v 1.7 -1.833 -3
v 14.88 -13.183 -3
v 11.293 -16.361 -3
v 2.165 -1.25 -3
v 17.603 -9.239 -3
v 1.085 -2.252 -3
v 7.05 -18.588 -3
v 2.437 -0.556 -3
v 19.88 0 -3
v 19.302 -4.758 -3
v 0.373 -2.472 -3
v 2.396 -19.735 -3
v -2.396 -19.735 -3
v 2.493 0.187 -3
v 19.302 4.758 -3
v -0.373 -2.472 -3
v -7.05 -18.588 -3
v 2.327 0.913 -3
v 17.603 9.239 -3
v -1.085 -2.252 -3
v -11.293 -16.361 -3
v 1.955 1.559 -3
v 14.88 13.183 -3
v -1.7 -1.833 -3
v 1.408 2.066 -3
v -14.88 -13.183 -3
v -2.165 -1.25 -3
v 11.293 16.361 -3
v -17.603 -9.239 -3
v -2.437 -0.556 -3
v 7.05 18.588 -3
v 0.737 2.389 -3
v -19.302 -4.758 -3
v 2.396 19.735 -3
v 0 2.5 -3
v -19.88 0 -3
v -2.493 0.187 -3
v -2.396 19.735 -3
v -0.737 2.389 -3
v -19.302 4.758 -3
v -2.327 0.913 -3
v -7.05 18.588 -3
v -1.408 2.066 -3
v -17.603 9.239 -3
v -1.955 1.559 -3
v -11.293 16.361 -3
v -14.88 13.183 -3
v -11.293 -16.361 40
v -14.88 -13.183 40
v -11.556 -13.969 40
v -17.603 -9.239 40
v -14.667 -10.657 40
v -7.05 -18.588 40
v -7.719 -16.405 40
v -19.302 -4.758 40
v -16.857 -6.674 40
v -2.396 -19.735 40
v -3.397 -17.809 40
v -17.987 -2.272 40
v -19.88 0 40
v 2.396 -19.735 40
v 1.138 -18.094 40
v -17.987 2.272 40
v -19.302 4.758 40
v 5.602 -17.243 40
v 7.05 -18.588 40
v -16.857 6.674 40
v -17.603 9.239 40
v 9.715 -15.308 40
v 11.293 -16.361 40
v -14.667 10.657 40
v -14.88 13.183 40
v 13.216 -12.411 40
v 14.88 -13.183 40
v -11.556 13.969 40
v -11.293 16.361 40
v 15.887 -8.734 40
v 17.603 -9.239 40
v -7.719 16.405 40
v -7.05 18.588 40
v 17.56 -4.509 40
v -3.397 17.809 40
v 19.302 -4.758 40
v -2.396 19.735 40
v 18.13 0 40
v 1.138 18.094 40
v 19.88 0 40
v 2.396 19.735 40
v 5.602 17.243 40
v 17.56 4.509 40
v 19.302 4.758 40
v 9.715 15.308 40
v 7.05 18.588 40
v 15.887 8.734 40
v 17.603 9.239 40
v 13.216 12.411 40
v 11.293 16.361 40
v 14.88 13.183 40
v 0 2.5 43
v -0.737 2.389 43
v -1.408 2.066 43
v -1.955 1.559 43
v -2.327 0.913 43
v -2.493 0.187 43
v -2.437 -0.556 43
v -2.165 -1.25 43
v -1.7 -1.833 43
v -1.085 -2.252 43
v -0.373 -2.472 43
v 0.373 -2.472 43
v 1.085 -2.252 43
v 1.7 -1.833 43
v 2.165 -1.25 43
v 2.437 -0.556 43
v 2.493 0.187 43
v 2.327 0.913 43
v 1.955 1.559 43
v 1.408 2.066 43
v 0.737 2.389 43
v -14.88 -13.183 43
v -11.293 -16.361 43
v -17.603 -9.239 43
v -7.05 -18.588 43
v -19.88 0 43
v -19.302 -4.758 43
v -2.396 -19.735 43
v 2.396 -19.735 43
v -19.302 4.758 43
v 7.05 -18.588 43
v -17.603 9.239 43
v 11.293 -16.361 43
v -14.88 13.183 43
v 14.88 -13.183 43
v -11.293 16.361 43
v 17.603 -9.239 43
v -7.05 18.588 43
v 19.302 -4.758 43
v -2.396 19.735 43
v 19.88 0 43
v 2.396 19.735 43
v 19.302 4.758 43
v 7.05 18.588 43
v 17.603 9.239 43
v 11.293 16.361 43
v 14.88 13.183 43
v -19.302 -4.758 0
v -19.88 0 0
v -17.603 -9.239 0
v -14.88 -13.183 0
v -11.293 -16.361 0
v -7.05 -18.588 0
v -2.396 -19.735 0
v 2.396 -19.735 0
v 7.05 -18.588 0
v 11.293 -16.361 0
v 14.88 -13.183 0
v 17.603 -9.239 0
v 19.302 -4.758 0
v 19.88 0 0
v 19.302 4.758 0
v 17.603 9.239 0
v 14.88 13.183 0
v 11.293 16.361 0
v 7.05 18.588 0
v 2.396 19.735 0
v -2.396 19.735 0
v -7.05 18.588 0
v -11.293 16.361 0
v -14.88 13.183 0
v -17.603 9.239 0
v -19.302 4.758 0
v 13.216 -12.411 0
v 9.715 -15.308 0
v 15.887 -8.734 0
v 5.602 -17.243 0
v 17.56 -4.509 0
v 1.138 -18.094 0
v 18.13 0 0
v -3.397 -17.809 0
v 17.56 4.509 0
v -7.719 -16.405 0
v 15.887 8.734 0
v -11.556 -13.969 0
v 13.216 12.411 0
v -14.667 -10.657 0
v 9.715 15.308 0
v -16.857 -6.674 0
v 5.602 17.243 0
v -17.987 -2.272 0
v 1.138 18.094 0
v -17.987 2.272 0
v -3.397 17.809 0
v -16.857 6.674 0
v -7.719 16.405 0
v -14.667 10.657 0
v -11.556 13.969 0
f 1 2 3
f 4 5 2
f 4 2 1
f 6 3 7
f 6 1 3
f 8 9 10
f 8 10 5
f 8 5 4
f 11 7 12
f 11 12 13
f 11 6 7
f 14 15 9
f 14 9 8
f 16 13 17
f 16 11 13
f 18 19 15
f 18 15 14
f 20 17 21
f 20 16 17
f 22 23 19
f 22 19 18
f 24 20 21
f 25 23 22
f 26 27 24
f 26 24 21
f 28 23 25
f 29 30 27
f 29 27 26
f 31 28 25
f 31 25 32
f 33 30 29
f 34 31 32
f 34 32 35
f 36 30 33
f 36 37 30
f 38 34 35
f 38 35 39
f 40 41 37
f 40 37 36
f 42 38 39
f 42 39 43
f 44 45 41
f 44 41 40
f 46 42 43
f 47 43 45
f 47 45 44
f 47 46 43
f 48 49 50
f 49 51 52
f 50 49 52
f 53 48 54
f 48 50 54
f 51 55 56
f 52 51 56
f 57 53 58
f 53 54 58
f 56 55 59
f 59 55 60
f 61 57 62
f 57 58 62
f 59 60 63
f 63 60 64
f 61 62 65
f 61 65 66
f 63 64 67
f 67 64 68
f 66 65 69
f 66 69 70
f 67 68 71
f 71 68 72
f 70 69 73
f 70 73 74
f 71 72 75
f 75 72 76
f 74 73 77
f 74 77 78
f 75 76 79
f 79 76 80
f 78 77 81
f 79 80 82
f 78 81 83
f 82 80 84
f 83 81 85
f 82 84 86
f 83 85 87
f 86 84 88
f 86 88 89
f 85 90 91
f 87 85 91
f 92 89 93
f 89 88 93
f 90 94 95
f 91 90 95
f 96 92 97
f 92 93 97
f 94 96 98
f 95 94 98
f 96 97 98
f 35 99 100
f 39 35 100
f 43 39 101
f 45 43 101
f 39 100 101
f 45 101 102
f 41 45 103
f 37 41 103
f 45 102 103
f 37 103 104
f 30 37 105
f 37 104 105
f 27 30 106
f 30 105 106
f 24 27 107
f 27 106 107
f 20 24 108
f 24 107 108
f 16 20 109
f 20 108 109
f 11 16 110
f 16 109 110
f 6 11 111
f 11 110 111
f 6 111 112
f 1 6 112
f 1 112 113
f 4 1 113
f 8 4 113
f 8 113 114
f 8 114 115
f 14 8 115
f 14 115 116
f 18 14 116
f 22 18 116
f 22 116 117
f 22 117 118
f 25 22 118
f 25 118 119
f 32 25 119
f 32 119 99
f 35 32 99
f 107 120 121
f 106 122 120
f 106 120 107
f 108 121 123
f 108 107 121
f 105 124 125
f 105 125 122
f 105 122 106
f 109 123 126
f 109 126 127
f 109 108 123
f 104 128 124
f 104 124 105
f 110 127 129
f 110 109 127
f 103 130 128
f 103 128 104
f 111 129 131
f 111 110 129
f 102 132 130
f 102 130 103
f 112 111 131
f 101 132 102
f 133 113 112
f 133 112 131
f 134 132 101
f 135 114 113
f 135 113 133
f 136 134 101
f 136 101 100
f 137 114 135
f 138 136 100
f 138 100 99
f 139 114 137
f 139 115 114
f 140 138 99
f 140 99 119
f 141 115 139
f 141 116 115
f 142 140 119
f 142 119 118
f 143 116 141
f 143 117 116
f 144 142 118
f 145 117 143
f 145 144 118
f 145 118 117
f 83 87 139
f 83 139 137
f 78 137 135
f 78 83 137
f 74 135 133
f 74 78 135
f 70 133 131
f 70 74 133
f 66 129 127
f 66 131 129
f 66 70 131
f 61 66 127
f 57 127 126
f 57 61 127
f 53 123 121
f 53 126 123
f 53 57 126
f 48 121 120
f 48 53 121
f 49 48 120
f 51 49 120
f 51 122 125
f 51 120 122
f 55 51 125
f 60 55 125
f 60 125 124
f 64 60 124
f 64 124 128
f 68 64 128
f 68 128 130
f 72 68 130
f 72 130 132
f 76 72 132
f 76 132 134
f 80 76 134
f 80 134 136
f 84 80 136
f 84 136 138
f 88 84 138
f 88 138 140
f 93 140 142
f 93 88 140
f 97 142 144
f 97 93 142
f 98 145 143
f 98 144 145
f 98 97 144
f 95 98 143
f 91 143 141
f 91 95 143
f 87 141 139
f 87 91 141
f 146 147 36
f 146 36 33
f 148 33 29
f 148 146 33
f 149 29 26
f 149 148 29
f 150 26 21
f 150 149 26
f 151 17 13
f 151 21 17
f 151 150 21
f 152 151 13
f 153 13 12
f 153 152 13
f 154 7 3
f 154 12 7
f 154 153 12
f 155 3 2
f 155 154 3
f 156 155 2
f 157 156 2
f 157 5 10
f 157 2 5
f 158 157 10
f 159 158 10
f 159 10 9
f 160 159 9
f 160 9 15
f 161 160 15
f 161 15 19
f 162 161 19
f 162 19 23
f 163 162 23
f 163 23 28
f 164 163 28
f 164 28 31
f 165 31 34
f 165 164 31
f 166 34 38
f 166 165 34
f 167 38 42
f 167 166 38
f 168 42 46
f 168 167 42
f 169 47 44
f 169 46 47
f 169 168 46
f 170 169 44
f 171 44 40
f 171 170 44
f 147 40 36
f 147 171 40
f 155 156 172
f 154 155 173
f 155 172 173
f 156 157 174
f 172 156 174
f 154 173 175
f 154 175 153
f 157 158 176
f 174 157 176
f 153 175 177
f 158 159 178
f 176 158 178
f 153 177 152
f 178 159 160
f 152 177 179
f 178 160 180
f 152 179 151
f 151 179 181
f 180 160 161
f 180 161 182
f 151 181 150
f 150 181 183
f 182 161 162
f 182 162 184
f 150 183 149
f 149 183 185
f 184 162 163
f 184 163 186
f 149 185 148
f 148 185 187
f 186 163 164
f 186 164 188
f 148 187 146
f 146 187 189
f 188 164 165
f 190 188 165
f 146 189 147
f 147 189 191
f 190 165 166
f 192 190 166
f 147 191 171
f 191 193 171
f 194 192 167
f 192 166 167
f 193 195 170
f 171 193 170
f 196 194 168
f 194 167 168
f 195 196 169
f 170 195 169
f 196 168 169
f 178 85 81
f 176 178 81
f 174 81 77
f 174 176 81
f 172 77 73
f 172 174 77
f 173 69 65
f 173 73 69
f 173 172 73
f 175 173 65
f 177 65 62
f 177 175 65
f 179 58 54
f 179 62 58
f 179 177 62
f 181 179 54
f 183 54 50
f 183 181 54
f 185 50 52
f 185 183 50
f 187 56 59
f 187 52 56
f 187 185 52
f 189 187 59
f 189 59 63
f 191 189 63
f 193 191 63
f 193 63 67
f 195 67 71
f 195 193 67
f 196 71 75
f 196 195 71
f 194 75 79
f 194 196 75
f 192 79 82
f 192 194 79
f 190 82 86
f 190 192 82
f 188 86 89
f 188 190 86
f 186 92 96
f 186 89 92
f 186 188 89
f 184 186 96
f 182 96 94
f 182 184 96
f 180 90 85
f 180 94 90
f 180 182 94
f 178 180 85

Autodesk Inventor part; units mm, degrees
ref_plane "YZ Plane" through (0, 0, 0) normal (1, 0, 0) x (0, 1, 0)
ref_plane "XZ Plane" through (0, 0, 0) normal (0, 1, 0) x (-1, 0, 0)
ref_plane "XY Plane" through (0, 0, 0) normal (0, 0, 1) x (1, 0, 0)
sketch "スケッチ1" plane through (0, 0, 0) normal (0, 0, 1) x (1, 0, 0)
  circle A0 centre (0, 0) radius 18.13
  dimension "d0" = 36.26
extrude "押し出し1" add sketch "スケッチ1" along normal blind 40
sketch "スケッチ2" plane through (0, 0, 40) normal (0, 0, 1) x (1, 0, 0)
  circle A0 centre (0, 0) radius 19.88
  dimension "d3" = 39.76
extrude "押し出し2" add sketch "スケッチ2" along normal blind 3
sketch "スケッチ3" plane through (0, 0, 0) normal (0, 0, -1) x (-1, 0, 0)
  circle A0 centre (0, 0) radius 19.88
  dimension "d6" = 39.76
extrude "押し出し3" add sketch "スケッチ3" along normal blind 3
sketch "スケッチ4" plane through (0, 0, -3) normal (0, 0, -1) x (-1, 0, 0)
  circle A0 centre (0, 0) radius 2.5
  dimension "d9" = 5
hole "穴1" at (0, 0, -3) direction (0, 0, 1) diameter 5 depth 46
equation "\"BendRadius\" = Thickness"
equation "\"BendReliefWidth\" = Thickness"
equation "\"BendReliefDepth\" = 0.5 * Thickness"
equation "\"CornerReliefSize\" = 4 * Thickness"
equation "\"MinimumRemnant\" = 2 * Thickness"
equation "\"TransitionRadius\" = BendRadius"
equation "\"JacobiRadiusSize\" = BendRadius"
equation "\"GapSize\" = Thickness"
equation "\"Thickness\" = 0.5"
properties part number "nhk13" material "ABS プラスチック"
